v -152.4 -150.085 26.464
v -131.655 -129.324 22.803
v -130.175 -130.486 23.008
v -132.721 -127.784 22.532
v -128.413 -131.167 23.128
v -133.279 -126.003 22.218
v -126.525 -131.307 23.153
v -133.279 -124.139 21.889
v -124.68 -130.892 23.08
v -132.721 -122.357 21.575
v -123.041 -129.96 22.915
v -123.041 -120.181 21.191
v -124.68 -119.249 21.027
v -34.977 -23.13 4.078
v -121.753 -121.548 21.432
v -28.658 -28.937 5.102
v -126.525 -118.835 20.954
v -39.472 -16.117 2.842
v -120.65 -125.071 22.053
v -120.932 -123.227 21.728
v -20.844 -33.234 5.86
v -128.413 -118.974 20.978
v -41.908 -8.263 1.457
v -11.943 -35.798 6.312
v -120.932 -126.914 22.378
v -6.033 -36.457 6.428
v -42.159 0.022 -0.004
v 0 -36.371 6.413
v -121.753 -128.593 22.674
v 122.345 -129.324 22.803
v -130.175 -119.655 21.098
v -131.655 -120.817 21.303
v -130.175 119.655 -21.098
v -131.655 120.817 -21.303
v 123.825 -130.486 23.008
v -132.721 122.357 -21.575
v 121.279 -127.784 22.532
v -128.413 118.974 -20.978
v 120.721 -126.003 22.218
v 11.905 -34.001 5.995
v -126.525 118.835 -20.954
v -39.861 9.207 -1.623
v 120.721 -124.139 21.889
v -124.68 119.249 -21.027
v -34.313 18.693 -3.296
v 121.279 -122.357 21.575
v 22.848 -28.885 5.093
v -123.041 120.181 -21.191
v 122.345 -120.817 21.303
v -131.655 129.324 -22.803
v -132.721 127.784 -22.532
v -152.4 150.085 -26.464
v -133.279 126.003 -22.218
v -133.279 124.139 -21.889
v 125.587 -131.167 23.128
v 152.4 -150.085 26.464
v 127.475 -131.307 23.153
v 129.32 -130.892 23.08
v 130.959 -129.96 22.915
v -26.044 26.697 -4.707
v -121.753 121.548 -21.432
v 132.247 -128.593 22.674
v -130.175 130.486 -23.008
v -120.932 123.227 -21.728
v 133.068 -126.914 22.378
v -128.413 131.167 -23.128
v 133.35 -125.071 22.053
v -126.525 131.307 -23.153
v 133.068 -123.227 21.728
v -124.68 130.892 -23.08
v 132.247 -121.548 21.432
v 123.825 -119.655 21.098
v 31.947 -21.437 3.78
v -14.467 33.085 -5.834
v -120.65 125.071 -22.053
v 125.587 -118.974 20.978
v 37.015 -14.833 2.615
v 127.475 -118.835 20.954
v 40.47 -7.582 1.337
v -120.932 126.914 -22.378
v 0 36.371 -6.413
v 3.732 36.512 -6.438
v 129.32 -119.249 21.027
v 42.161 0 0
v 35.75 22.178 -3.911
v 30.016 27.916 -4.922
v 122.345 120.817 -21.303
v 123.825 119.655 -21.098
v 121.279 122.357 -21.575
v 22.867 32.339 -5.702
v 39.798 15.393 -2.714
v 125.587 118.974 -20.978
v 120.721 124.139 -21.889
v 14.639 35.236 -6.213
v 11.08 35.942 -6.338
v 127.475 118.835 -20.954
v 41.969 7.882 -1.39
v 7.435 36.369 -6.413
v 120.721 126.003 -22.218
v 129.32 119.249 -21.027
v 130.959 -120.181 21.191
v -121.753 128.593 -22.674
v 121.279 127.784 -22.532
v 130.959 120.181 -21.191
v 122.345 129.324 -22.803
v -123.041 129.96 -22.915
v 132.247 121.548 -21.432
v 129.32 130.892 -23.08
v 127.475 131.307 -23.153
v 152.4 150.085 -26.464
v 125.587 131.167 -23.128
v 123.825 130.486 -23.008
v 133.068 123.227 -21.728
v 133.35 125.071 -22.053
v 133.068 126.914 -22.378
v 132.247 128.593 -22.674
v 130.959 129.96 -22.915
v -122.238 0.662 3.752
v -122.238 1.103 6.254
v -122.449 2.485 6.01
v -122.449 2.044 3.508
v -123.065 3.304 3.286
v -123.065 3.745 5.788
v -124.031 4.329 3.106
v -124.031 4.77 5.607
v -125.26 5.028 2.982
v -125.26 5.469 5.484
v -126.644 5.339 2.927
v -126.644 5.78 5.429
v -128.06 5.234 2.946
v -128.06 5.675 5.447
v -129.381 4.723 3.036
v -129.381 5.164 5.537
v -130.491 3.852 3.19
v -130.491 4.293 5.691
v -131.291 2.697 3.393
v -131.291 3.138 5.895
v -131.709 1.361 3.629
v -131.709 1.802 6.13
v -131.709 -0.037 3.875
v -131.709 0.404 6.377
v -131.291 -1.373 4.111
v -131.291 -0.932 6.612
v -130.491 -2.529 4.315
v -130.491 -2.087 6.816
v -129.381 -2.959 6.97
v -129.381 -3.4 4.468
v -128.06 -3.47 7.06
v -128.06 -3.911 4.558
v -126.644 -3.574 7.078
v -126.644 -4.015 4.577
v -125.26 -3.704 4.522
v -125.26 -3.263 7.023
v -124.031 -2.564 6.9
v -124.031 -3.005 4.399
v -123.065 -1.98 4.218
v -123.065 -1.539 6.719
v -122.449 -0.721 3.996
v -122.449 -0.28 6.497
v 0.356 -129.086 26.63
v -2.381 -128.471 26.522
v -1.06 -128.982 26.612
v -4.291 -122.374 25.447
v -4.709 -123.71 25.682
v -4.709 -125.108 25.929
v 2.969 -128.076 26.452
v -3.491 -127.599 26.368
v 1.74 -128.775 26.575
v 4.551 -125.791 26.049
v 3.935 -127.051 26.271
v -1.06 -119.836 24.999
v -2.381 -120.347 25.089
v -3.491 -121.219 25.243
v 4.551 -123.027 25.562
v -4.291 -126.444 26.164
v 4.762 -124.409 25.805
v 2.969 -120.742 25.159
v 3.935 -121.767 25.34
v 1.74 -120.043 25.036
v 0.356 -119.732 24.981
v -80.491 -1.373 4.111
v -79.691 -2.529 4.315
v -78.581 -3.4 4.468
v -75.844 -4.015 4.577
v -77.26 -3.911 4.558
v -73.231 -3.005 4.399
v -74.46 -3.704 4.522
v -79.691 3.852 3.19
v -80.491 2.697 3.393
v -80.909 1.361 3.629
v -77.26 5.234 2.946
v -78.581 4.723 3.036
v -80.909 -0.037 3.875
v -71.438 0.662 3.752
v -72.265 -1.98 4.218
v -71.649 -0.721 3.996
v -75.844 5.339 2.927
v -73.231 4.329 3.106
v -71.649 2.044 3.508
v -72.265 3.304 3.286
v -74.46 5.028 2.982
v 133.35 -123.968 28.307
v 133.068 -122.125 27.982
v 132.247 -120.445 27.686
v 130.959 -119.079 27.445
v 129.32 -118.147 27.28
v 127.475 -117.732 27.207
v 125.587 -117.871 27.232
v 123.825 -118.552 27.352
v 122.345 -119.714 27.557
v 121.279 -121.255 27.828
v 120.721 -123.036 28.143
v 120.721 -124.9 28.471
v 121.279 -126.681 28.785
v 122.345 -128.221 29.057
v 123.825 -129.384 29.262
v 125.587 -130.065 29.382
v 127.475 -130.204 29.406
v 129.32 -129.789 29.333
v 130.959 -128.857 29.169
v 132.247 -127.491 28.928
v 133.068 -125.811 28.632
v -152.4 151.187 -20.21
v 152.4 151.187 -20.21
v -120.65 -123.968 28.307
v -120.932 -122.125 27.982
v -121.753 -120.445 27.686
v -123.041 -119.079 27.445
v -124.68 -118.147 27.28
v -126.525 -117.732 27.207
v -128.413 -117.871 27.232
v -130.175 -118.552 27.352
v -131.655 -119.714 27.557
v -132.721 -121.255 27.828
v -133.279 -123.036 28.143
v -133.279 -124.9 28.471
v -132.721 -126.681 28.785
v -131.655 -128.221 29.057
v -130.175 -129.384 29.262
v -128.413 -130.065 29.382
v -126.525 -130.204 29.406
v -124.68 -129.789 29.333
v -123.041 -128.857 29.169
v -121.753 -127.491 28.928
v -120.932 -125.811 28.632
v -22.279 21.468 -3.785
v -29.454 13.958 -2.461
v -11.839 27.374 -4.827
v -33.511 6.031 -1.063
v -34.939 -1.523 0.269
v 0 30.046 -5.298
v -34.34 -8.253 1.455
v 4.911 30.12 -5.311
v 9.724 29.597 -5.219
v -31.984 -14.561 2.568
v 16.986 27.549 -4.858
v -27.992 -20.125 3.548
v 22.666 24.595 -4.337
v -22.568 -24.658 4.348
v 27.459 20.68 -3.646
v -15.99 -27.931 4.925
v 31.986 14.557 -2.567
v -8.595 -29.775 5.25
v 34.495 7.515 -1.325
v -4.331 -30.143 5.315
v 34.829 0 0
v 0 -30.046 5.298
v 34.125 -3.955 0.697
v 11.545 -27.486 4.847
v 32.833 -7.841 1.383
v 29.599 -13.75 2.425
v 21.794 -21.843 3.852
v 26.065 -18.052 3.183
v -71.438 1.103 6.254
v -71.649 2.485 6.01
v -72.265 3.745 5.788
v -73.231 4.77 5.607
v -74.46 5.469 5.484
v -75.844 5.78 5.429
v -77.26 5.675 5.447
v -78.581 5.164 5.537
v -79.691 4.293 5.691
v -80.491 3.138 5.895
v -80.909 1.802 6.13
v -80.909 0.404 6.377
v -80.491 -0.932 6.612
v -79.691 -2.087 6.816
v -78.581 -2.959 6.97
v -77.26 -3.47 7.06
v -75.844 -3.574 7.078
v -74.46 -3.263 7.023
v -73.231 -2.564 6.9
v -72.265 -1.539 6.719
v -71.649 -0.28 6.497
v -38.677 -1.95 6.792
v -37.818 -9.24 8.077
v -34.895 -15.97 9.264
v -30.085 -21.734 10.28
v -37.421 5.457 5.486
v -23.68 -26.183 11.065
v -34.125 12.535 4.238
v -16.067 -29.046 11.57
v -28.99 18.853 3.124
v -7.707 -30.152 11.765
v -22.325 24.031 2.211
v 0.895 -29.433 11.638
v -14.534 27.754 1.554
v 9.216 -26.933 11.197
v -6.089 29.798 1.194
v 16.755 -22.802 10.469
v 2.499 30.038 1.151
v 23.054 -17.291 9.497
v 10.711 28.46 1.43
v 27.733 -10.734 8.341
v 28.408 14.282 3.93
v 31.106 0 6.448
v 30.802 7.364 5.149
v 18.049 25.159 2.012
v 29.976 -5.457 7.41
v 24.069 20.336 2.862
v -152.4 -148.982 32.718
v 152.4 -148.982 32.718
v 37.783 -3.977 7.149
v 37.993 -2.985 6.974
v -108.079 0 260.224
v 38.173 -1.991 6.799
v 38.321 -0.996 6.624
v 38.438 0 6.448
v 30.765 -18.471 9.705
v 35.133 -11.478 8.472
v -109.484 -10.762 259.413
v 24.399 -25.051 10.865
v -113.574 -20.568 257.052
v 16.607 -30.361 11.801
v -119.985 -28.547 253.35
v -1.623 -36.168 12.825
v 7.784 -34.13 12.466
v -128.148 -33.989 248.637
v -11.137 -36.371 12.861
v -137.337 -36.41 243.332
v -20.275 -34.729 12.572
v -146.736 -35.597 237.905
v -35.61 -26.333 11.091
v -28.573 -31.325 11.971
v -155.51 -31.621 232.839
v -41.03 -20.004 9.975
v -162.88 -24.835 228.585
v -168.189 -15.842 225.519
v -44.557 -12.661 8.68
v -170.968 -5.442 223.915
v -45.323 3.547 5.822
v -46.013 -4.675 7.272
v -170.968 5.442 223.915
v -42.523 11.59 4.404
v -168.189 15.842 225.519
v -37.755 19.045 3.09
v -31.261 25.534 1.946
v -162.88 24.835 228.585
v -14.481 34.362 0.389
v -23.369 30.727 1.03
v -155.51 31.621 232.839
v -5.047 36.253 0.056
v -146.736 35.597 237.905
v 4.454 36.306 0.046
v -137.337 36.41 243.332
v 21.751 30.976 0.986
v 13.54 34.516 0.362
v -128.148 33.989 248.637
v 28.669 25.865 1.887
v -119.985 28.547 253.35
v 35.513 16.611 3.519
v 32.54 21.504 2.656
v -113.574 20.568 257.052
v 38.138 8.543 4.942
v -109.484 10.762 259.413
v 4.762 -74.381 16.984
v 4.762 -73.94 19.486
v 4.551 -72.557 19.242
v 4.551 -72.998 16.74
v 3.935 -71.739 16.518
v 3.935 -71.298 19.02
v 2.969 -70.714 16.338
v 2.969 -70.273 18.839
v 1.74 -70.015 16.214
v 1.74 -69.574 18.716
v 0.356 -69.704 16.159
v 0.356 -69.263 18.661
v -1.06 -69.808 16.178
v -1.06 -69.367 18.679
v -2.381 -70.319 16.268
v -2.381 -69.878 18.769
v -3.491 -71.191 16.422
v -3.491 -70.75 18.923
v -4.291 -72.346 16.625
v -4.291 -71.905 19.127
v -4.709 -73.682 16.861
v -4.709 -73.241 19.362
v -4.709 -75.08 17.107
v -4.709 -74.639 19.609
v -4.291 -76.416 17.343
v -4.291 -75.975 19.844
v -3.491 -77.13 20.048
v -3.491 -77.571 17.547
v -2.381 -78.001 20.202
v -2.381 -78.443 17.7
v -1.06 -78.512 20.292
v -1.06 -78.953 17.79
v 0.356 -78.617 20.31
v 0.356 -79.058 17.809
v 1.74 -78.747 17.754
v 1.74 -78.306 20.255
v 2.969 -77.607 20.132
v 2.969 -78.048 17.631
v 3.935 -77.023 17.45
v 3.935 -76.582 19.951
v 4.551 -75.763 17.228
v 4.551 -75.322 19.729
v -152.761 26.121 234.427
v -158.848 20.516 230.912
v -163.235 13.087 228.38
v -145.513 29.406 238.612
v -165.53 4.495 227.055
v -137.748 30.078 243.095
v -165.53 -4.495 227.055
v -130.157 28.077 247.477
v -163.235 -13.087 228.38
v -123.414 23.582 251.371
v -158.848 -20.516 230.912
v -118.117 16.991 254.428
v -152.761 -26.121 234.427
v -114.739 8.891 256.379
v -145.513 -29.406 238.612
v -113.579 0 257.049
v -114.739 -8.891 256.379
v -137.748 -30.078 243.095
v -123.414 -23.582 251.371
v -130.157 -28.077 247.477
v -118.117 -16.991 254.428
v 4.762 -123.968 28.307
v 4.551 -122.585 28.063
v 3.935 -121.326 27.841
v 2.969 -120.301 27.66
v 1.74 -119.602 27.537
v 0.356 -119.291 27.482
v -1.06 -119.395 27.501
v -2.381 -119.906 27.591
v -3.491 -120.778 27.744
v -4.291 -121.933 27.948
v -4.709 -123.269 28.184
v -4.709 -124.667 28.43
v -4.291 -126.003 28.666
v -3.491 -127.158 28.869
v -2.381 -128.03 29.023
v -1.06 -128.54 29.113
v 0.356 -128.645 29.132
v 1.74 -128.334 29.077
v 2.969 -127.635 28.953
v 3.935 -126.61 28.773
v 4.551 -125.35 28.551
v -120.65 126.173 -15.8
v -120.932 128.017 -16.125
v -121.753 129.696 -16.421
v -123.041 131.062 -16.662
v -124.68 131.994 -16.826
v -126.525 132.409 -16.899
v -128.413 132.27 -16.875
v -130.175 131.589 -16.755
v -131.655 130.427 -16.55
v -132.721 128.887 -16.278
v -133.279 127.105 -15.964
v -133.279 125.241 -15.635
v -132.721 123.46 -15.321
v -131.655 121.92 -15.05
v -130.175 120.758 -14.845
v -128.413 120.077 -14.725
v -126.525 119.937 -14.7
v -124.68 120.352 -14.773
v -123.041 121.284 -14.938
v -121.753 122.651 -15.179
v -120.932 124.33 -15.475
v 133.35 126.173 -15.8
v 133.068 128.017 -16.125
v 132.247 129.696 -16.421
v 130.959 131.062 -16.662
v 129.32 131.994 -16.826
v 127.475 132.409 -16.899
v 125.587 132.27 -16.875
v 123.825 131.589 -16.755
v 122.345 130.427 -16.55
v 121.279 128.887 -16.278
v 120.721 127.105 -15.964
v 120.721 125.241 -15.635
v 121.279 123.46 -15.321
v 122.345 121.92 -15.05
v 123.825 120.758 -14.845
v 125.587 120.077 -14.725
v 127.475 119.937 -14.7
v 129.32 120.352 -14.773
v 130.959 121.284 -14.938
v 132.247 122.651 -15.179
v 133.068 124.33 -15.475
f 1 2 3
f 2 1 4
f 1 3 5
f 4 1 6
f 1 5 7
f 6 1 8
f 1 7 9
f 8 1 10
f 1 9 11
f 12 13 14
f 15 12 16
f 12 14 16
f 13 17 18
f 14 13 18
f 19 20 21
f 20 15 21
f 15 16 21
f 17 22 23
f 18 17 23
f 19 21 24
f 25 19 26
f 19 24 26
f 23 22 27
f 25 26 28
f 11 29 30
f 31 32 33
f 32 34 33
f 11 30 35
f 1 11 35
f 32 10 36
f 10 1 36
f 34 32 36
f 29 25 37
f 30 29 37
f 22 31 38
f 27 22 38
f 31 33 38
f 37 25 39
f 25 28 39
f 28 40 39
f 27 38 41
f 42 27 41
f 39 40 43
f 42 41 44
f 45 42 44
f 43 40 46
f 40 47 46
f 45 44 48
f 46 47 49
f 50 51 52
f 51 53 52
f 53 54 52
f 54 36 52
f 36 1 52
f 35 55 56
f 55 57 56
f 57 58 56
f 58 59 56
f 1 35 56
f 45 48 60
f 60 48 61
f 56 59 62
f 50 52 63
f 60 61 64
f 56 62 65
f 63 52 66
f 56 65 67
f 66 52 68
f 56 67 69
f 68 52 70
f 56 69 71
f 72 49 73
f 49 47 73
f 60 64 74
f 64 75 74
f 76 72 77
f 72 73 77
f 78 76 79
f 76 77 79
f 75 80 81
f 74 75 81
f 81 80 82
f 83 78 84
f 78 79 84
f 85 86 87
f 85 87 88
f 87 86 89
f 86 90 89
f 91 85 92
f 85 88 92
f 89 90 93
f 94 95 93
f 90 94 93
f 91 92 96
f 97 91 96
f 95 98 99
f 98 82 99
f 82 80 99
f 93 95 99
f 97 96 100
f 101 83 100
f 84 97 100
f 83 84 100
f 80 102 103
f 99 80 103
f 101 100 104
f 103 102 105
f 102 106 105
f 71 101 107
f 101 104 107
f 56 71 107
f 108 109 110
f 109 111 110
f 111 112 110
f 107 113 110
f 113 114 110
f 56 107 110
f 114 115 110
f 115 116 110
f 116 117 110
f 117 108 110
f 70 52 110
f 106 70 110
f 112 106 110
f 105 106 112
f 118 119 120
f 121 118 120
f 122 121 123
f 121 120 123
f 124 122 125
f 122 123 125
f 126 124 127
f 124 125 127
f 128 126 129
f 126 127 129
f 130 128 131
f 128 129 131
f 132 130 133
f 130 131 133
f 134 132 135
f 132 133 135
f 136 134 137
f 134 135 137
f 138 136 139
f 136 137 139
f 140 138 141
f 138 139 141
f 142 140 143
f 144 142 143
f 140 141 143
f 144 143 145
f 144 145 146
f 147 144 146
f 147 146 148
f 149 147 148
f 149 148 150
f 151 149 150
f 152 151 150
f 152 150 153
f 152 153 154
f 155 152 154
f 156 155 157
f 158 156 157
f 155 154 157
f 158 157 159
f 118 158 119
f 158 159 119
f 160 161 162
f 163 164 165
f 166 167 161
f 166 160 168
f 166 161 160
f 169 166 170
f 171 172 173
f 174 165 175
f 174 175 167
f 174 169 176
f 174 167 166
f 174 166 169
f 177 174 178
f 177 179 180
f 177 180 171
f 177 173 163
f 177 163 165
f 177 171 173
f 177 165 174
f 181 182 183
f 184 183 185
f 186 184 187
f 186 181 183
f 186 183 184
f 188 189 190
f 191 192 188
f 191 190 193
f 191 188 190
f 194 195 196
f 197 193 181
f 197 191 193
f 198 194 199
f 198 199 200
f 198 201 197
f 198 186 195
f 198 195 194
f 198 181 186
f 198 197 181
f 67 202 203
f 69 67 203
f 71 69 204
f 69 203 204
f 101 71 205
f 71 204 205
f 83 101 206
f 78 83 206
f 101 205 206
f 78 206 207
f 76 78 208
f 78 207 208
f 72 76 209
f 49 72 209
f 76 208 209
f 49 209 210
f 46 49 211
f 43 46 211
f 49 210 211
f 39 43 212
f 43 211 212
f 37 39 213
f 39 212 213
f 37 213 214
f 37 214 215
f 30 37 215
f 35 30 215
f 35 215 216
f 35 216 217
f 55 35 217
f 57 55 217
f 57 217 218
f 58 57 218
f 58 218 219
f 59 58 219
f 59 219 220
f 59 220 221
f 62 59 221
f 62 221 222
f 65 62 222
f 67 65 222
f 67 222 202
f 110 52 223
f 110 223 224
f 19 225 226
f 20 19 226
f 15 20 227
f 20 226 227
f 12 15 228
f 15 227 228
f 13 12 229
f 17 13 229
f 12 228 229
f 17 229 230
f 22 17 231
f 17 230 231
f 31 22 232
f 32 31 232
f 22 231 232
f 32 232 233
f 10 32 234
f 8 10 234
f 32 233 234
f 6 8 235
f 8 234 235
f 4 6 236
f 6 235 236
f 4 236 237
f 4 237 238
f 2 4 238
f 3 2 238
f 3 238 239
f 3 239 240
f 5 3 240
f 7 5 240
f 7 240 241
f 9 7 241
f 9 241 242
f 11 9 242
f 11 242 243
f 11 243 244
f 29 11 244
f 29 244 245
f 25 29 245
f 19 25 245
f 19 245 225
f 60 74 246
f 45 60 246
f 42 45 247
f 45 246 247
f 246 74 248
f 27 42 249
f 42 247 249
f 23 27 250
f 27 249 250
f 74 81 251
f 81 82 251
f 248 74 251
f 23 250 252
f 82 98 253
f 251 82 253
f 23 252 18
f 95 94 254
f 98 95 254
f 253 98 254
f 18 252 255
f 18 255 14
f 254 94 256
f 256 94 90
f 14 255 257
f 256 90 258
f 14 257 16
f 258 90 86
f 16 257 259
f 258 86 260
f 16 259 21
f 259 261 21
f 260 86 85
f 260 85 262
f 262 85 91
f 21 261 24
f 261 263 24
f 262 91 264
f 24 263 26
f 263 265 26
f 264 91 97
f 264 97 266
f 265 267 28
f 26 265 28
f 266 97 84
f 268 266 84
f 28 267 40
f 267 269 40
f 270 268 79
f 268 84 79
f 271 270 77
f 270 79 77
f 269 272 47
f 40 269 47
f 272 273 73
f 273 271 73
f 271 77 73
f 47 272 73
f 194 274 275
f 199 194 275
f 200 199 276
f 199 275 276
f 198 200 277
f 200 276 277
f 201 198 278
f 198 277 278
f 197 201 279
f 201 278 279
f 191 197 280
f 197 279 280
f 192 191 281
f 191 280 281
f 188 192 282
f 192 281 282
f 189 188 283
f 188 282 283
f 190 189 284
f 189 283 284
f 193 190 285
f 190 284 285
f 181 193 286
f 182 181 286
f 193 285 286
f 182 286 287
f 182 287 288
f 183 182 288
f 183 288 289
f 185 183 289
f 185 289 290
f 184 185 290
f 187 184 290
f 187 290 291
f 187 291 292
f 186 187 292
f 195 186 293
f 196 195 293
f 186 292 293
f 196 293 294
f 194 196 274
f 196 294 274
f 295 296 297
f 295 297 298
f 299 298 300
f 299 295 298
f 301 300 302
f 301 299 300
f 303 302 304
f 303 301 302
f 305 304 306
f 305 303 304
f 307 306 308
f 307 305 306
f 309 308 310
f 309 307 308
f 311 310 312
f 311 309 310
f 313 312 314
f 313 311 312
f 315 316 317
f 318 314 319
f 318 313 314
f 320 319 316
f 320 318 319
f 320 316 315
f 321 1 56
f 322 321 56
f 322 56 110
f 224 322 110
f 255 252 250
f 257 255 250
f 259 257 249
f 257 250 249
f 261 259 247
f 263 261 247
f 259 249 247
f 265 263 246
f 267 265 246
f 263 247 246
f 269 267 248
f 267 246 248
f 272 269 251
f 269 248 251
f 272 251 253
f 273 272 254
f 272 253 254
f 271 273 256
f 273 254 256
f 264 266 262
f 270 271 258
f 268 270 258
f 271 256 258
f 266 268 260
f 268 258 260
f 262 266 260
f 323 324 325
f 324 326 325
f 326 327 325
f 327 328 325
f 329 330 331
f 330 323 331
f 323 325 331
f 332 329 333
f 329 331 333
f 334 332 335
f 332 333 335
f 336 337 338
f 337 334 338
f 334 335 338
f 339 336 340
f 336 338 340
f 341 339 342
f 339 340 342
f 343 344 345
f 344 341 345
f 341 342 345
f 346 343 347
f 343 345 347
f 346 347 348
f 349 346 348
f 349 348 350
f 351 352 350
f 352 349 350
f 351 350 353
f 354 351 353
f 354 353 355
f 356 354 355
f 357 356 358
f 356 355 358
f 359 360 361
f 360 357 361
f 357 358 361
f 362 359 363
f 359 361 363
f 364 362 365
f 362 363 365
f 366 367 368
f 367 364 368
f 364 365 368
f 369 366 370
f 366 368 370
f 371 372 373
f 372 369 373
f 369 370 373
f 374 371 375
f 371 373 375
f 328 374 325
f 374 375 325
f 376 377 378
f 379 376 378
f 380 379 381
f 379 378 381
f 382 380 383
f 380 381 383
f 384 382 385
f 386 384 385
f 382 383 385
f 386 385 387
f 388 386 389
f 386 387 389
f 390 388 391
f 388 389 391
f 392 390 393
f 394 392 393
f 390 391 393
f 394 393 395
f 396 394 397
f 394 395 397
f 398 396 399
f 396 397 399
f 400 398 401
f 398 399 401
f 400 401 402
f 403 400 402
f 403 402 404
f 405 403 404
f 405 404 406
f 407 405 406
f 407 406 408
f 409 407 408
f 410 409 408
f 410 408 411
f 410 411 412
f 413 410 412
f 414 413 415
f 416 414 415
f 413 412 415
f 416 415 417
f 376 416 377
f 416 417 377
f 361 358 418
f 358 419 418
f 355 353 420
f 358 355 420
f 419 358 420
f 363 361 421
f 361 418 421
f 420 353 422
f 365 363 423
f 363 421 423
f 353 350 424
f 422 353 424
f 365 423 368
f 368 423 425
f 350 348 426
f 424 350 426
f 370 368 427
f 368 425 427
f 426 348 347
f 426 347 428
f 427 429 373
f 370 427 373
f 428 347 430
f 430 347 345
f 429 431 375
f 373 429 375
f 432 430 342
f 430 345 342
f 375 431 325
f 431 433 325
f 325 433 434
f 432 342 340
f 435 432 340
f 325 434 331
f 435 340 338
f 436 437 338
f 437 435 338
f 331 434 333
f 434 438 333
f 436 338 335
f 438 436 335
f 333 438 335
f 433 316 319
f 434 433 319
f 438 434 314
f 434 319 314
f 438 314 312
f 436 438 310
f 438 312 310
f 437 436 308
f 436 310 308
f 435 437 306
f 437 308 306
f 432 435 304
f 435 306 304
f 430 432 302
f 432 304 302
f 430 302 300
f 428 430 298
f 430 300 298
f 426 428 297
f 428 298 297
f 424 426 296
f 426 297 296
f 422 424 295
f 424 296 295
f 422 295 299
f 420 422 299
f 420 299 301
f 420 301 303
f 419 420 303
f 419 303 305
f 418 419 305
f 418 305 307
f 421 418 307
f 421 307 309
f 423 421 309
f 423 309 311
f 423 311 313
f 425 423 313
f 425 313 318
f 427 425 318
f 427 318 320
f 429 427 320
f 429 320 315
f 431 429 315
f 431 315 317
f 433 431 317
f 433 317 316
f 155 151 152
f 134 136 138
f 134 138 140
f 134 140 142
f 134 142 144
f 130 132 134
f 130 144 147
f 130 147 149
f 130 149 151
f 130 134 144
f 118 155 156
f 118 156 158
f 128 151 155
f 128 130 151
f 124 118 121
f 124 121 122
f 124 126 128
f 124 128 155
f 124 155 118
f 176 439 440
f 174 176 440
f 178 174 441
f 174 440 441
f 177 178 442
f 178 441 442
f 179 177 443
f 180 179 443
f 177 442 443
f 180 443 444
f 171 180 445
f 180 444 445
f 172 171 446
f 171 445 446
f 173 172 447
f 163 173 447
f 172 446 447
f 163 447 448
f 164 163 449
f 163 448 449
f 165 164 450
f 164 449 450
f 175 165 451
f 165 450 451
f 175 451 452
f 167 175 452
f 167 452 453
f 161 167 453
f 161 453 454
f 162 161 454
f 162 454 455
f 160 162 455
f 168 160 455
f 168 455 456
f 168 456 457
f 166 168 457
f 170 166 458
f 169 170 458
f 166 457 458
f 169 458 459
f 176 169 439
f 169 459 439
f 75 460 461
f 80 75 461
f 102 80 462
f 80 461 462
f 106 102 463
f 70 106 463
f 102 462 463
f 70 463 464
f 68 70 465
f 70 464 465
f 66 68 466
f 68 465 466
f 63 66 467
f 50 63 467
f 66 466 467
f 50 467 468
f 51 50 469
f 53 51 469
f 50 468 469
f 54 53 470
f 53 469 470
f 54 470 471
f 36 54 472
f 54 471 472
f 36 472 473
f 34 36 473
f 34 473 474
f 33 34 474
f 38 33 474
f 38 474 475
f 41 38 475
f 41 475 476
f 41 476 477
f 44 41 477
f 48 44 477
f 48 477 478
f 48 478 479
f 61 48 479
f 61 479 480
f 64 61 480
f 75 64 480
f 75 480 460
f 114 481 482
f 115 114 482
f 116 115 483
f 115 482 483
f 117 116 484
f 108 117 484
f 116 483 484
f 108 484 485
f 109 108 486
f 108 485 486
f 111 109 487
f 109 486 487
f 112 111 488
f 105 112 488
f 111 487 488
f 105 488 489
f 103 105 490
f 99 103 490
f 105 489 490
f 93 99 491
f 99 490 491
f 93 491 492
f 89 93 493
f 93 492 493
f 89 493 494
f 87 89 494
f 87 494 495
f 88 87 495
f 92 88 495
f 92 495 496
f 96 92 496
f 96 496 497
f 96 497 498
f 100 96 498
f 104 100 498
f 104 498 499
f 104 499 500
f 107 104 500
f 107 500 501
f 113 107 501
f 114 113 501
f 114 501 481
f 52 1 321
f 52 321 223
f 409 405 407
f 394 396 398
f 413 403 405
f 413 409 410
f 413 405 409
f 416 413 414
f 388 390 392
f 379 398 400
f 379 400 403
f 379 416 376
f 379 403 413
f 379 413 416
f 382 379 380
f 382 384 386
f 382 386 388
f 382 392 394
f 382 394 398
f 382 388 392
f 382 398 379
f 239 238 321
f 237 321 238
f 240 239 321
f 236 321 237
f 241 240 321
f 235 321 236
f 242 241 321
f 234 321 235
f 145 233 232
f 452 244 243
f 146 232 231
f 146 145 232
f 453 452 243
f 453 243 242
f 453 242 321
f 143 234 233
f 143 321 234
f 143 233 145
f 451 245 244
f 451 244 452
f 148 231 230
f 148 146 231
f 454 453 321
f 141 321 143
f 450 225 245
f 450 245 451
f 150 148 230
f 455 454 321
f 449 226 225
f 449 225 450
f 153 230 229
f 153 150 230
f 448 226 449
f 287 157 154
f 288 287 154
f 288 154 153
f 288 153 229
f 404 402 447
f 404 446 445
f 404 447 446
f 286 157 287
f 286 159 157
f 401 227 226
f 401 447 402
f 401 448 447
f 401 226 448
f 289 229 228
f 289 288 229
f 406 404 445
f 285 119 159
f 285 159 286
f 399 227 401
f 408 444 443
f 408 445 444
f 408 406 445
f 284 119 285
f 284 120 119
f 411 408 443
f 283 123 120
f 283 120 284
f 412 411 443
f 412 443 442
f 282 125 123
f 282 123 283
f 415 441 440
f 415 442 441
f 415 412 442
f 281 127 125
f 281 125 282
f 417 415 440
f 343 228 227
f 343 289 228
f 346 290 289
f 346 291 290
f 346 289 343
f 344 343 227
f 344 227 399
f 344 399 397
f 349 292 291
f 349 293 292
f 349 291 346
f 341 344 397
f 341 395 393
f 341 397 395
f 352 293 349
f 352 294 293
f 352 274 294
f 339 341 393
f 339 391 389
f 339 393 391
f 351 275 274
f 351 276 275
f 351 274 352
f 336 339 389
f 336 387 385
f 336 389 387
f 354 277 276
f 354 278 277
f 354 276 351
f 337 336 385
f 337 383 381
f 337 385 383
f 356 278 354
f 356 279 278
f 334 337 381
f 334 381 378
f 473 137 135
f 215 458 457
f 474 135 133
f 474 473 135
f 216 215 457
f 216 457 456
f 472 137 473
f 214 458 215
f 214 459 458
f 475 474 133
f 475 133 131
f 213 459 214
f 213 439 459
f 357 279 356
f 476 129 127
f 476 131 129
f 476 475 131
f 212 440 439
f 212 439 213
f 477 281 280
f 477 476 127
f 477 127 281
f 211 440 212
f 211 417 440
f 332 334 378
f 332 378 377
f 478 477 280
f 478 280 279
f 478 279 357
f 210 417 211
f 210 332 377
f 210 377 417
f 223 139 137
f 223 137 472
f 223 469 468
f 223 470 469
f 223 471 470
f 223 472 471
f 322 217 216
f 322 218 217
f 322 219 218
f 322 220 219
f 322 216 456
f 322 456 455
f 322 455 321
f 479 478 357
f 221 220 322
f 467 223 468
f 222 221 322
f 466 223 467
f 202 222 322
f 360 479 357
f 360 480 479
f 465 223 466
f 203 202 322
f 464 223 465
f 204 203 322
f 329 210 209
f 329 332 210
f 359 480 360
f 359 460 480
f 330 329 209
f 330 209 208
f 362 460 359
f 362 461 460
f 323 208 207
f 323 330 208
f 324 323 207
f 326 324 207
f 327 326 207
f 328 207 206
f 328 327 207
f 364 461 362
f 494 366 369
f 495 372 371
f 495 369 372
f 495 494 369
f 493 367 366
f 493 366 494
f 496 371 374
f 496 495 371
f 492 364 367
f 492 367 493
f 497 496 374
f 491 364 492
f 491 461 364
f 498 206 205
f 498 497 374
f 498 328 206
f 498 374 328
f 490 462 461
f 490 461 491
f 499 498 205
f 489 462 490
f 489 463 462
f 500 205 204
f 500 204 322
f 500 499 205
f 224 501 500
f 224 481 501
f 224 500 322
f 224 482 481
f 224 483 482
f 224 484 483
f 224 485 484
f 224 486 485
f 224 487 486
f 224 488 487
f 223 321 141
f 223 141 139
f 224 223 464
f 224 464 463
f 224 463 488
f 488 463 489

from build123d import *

# Parameters (mm, degrees)
F2_W          = 304.8
F2_H          = 304.8
F3_DEPTH      = 6.35
F5_R          = 36.5125
F5_R_2        = 30.1625
F6_DEPTH      = 292.1
F6_DEPTH_BACK = 12.7
F8_DEPTH      = 50.8
F8_DEPTH_BACK = 50.8
F9_R          = 4.7625
F10_DEPTH     = 2.54
F11_R         = 6.35
F12_DEPTH     = 25.4


with BuildPart() as f3:
    # F2 (on line) → F3 (new body)
    with BuildSketch(Plane(origin=(0, 0, 0), x_dir=(1, 0, 0), z_dir=(0, 0.1736481777, 0.984807753))):
        Rectangle(F2_W, F2_H)
    extrude(amount=F3_DEPTH)

    # F5 (on line) → F6 (join, two sides)
    with BuildSketch(Plane(origin=(6.35, 0, -10.9985226281), x_dir=(0.8660254038, 0, 0.5), z_dir=(0.5, 0, -0.8660254038))) as f6_sk:
        Circle(F5_R)
        Circle(F5_R_2, mode=Mode.SUBTRACT)
    extrude(amount=-F6_DEPTH)
    extrude(f6_sk.sketch, amount=F6_DEPTH_BACK)

    # F7 (on Right) → F8 (cut, two sides)
    with BuildSketch(Plane.YZ) as f8_sk:
        Polygon((56.8870845878, -43.9009879504), (56.8870845878, -10.0307278667), (-39.12624161, 6.8990120496), (-39.12624161, -43.9009879504), align=None)
    extrude(amount=-F8_DEPTH, mode=Mode.SUBTRACT)
    extrude(f8_sk.sketch, amount=F8_DEPTH_BACK, mode=Mode.SUBTRACT)

    # F9 (on face) → F10 (cut)
    with BuildSketch(Plane(origin=(0, 1.1026659282, 6.2535292316), x_dir=(1, 0, 0), z_dir=(0, 0.1736481777, 0.984807753))):
        with Locations((0, -76.2)):
            Circle(F9_R)
        with Locations((0, -127)):
            Circle(F9_R)
        with Locations((-127, 0)):
            Circle(F9_R)
        with Locations((-76.2, 0)):
            Circle(F9_R)
    extrude(amount=-F10_DEPTH, mode=Mode.SUBTRACT)

    # F11 (on face) → F12 (cut)
    with BuildSketch(Plane(origin=(0, 1.1026659282, 6.2535292316), x_dir=(1, 0, 0), z_dir=(0, 0.1736481777, 0.984807753))):
        with Locations((127, 127)):
            Circle(F11_R)
        with Locations((127, -127)):
            Circle(F11_R)
        with Locations((-127, -127)):
            Circle(F11_R)
        with Locations((-127, 127)):
            Circle(F11_R)
    extrude(amount=-F12_DEPTH, mode=Mode.SUBTRACT)


solid = f3.part
